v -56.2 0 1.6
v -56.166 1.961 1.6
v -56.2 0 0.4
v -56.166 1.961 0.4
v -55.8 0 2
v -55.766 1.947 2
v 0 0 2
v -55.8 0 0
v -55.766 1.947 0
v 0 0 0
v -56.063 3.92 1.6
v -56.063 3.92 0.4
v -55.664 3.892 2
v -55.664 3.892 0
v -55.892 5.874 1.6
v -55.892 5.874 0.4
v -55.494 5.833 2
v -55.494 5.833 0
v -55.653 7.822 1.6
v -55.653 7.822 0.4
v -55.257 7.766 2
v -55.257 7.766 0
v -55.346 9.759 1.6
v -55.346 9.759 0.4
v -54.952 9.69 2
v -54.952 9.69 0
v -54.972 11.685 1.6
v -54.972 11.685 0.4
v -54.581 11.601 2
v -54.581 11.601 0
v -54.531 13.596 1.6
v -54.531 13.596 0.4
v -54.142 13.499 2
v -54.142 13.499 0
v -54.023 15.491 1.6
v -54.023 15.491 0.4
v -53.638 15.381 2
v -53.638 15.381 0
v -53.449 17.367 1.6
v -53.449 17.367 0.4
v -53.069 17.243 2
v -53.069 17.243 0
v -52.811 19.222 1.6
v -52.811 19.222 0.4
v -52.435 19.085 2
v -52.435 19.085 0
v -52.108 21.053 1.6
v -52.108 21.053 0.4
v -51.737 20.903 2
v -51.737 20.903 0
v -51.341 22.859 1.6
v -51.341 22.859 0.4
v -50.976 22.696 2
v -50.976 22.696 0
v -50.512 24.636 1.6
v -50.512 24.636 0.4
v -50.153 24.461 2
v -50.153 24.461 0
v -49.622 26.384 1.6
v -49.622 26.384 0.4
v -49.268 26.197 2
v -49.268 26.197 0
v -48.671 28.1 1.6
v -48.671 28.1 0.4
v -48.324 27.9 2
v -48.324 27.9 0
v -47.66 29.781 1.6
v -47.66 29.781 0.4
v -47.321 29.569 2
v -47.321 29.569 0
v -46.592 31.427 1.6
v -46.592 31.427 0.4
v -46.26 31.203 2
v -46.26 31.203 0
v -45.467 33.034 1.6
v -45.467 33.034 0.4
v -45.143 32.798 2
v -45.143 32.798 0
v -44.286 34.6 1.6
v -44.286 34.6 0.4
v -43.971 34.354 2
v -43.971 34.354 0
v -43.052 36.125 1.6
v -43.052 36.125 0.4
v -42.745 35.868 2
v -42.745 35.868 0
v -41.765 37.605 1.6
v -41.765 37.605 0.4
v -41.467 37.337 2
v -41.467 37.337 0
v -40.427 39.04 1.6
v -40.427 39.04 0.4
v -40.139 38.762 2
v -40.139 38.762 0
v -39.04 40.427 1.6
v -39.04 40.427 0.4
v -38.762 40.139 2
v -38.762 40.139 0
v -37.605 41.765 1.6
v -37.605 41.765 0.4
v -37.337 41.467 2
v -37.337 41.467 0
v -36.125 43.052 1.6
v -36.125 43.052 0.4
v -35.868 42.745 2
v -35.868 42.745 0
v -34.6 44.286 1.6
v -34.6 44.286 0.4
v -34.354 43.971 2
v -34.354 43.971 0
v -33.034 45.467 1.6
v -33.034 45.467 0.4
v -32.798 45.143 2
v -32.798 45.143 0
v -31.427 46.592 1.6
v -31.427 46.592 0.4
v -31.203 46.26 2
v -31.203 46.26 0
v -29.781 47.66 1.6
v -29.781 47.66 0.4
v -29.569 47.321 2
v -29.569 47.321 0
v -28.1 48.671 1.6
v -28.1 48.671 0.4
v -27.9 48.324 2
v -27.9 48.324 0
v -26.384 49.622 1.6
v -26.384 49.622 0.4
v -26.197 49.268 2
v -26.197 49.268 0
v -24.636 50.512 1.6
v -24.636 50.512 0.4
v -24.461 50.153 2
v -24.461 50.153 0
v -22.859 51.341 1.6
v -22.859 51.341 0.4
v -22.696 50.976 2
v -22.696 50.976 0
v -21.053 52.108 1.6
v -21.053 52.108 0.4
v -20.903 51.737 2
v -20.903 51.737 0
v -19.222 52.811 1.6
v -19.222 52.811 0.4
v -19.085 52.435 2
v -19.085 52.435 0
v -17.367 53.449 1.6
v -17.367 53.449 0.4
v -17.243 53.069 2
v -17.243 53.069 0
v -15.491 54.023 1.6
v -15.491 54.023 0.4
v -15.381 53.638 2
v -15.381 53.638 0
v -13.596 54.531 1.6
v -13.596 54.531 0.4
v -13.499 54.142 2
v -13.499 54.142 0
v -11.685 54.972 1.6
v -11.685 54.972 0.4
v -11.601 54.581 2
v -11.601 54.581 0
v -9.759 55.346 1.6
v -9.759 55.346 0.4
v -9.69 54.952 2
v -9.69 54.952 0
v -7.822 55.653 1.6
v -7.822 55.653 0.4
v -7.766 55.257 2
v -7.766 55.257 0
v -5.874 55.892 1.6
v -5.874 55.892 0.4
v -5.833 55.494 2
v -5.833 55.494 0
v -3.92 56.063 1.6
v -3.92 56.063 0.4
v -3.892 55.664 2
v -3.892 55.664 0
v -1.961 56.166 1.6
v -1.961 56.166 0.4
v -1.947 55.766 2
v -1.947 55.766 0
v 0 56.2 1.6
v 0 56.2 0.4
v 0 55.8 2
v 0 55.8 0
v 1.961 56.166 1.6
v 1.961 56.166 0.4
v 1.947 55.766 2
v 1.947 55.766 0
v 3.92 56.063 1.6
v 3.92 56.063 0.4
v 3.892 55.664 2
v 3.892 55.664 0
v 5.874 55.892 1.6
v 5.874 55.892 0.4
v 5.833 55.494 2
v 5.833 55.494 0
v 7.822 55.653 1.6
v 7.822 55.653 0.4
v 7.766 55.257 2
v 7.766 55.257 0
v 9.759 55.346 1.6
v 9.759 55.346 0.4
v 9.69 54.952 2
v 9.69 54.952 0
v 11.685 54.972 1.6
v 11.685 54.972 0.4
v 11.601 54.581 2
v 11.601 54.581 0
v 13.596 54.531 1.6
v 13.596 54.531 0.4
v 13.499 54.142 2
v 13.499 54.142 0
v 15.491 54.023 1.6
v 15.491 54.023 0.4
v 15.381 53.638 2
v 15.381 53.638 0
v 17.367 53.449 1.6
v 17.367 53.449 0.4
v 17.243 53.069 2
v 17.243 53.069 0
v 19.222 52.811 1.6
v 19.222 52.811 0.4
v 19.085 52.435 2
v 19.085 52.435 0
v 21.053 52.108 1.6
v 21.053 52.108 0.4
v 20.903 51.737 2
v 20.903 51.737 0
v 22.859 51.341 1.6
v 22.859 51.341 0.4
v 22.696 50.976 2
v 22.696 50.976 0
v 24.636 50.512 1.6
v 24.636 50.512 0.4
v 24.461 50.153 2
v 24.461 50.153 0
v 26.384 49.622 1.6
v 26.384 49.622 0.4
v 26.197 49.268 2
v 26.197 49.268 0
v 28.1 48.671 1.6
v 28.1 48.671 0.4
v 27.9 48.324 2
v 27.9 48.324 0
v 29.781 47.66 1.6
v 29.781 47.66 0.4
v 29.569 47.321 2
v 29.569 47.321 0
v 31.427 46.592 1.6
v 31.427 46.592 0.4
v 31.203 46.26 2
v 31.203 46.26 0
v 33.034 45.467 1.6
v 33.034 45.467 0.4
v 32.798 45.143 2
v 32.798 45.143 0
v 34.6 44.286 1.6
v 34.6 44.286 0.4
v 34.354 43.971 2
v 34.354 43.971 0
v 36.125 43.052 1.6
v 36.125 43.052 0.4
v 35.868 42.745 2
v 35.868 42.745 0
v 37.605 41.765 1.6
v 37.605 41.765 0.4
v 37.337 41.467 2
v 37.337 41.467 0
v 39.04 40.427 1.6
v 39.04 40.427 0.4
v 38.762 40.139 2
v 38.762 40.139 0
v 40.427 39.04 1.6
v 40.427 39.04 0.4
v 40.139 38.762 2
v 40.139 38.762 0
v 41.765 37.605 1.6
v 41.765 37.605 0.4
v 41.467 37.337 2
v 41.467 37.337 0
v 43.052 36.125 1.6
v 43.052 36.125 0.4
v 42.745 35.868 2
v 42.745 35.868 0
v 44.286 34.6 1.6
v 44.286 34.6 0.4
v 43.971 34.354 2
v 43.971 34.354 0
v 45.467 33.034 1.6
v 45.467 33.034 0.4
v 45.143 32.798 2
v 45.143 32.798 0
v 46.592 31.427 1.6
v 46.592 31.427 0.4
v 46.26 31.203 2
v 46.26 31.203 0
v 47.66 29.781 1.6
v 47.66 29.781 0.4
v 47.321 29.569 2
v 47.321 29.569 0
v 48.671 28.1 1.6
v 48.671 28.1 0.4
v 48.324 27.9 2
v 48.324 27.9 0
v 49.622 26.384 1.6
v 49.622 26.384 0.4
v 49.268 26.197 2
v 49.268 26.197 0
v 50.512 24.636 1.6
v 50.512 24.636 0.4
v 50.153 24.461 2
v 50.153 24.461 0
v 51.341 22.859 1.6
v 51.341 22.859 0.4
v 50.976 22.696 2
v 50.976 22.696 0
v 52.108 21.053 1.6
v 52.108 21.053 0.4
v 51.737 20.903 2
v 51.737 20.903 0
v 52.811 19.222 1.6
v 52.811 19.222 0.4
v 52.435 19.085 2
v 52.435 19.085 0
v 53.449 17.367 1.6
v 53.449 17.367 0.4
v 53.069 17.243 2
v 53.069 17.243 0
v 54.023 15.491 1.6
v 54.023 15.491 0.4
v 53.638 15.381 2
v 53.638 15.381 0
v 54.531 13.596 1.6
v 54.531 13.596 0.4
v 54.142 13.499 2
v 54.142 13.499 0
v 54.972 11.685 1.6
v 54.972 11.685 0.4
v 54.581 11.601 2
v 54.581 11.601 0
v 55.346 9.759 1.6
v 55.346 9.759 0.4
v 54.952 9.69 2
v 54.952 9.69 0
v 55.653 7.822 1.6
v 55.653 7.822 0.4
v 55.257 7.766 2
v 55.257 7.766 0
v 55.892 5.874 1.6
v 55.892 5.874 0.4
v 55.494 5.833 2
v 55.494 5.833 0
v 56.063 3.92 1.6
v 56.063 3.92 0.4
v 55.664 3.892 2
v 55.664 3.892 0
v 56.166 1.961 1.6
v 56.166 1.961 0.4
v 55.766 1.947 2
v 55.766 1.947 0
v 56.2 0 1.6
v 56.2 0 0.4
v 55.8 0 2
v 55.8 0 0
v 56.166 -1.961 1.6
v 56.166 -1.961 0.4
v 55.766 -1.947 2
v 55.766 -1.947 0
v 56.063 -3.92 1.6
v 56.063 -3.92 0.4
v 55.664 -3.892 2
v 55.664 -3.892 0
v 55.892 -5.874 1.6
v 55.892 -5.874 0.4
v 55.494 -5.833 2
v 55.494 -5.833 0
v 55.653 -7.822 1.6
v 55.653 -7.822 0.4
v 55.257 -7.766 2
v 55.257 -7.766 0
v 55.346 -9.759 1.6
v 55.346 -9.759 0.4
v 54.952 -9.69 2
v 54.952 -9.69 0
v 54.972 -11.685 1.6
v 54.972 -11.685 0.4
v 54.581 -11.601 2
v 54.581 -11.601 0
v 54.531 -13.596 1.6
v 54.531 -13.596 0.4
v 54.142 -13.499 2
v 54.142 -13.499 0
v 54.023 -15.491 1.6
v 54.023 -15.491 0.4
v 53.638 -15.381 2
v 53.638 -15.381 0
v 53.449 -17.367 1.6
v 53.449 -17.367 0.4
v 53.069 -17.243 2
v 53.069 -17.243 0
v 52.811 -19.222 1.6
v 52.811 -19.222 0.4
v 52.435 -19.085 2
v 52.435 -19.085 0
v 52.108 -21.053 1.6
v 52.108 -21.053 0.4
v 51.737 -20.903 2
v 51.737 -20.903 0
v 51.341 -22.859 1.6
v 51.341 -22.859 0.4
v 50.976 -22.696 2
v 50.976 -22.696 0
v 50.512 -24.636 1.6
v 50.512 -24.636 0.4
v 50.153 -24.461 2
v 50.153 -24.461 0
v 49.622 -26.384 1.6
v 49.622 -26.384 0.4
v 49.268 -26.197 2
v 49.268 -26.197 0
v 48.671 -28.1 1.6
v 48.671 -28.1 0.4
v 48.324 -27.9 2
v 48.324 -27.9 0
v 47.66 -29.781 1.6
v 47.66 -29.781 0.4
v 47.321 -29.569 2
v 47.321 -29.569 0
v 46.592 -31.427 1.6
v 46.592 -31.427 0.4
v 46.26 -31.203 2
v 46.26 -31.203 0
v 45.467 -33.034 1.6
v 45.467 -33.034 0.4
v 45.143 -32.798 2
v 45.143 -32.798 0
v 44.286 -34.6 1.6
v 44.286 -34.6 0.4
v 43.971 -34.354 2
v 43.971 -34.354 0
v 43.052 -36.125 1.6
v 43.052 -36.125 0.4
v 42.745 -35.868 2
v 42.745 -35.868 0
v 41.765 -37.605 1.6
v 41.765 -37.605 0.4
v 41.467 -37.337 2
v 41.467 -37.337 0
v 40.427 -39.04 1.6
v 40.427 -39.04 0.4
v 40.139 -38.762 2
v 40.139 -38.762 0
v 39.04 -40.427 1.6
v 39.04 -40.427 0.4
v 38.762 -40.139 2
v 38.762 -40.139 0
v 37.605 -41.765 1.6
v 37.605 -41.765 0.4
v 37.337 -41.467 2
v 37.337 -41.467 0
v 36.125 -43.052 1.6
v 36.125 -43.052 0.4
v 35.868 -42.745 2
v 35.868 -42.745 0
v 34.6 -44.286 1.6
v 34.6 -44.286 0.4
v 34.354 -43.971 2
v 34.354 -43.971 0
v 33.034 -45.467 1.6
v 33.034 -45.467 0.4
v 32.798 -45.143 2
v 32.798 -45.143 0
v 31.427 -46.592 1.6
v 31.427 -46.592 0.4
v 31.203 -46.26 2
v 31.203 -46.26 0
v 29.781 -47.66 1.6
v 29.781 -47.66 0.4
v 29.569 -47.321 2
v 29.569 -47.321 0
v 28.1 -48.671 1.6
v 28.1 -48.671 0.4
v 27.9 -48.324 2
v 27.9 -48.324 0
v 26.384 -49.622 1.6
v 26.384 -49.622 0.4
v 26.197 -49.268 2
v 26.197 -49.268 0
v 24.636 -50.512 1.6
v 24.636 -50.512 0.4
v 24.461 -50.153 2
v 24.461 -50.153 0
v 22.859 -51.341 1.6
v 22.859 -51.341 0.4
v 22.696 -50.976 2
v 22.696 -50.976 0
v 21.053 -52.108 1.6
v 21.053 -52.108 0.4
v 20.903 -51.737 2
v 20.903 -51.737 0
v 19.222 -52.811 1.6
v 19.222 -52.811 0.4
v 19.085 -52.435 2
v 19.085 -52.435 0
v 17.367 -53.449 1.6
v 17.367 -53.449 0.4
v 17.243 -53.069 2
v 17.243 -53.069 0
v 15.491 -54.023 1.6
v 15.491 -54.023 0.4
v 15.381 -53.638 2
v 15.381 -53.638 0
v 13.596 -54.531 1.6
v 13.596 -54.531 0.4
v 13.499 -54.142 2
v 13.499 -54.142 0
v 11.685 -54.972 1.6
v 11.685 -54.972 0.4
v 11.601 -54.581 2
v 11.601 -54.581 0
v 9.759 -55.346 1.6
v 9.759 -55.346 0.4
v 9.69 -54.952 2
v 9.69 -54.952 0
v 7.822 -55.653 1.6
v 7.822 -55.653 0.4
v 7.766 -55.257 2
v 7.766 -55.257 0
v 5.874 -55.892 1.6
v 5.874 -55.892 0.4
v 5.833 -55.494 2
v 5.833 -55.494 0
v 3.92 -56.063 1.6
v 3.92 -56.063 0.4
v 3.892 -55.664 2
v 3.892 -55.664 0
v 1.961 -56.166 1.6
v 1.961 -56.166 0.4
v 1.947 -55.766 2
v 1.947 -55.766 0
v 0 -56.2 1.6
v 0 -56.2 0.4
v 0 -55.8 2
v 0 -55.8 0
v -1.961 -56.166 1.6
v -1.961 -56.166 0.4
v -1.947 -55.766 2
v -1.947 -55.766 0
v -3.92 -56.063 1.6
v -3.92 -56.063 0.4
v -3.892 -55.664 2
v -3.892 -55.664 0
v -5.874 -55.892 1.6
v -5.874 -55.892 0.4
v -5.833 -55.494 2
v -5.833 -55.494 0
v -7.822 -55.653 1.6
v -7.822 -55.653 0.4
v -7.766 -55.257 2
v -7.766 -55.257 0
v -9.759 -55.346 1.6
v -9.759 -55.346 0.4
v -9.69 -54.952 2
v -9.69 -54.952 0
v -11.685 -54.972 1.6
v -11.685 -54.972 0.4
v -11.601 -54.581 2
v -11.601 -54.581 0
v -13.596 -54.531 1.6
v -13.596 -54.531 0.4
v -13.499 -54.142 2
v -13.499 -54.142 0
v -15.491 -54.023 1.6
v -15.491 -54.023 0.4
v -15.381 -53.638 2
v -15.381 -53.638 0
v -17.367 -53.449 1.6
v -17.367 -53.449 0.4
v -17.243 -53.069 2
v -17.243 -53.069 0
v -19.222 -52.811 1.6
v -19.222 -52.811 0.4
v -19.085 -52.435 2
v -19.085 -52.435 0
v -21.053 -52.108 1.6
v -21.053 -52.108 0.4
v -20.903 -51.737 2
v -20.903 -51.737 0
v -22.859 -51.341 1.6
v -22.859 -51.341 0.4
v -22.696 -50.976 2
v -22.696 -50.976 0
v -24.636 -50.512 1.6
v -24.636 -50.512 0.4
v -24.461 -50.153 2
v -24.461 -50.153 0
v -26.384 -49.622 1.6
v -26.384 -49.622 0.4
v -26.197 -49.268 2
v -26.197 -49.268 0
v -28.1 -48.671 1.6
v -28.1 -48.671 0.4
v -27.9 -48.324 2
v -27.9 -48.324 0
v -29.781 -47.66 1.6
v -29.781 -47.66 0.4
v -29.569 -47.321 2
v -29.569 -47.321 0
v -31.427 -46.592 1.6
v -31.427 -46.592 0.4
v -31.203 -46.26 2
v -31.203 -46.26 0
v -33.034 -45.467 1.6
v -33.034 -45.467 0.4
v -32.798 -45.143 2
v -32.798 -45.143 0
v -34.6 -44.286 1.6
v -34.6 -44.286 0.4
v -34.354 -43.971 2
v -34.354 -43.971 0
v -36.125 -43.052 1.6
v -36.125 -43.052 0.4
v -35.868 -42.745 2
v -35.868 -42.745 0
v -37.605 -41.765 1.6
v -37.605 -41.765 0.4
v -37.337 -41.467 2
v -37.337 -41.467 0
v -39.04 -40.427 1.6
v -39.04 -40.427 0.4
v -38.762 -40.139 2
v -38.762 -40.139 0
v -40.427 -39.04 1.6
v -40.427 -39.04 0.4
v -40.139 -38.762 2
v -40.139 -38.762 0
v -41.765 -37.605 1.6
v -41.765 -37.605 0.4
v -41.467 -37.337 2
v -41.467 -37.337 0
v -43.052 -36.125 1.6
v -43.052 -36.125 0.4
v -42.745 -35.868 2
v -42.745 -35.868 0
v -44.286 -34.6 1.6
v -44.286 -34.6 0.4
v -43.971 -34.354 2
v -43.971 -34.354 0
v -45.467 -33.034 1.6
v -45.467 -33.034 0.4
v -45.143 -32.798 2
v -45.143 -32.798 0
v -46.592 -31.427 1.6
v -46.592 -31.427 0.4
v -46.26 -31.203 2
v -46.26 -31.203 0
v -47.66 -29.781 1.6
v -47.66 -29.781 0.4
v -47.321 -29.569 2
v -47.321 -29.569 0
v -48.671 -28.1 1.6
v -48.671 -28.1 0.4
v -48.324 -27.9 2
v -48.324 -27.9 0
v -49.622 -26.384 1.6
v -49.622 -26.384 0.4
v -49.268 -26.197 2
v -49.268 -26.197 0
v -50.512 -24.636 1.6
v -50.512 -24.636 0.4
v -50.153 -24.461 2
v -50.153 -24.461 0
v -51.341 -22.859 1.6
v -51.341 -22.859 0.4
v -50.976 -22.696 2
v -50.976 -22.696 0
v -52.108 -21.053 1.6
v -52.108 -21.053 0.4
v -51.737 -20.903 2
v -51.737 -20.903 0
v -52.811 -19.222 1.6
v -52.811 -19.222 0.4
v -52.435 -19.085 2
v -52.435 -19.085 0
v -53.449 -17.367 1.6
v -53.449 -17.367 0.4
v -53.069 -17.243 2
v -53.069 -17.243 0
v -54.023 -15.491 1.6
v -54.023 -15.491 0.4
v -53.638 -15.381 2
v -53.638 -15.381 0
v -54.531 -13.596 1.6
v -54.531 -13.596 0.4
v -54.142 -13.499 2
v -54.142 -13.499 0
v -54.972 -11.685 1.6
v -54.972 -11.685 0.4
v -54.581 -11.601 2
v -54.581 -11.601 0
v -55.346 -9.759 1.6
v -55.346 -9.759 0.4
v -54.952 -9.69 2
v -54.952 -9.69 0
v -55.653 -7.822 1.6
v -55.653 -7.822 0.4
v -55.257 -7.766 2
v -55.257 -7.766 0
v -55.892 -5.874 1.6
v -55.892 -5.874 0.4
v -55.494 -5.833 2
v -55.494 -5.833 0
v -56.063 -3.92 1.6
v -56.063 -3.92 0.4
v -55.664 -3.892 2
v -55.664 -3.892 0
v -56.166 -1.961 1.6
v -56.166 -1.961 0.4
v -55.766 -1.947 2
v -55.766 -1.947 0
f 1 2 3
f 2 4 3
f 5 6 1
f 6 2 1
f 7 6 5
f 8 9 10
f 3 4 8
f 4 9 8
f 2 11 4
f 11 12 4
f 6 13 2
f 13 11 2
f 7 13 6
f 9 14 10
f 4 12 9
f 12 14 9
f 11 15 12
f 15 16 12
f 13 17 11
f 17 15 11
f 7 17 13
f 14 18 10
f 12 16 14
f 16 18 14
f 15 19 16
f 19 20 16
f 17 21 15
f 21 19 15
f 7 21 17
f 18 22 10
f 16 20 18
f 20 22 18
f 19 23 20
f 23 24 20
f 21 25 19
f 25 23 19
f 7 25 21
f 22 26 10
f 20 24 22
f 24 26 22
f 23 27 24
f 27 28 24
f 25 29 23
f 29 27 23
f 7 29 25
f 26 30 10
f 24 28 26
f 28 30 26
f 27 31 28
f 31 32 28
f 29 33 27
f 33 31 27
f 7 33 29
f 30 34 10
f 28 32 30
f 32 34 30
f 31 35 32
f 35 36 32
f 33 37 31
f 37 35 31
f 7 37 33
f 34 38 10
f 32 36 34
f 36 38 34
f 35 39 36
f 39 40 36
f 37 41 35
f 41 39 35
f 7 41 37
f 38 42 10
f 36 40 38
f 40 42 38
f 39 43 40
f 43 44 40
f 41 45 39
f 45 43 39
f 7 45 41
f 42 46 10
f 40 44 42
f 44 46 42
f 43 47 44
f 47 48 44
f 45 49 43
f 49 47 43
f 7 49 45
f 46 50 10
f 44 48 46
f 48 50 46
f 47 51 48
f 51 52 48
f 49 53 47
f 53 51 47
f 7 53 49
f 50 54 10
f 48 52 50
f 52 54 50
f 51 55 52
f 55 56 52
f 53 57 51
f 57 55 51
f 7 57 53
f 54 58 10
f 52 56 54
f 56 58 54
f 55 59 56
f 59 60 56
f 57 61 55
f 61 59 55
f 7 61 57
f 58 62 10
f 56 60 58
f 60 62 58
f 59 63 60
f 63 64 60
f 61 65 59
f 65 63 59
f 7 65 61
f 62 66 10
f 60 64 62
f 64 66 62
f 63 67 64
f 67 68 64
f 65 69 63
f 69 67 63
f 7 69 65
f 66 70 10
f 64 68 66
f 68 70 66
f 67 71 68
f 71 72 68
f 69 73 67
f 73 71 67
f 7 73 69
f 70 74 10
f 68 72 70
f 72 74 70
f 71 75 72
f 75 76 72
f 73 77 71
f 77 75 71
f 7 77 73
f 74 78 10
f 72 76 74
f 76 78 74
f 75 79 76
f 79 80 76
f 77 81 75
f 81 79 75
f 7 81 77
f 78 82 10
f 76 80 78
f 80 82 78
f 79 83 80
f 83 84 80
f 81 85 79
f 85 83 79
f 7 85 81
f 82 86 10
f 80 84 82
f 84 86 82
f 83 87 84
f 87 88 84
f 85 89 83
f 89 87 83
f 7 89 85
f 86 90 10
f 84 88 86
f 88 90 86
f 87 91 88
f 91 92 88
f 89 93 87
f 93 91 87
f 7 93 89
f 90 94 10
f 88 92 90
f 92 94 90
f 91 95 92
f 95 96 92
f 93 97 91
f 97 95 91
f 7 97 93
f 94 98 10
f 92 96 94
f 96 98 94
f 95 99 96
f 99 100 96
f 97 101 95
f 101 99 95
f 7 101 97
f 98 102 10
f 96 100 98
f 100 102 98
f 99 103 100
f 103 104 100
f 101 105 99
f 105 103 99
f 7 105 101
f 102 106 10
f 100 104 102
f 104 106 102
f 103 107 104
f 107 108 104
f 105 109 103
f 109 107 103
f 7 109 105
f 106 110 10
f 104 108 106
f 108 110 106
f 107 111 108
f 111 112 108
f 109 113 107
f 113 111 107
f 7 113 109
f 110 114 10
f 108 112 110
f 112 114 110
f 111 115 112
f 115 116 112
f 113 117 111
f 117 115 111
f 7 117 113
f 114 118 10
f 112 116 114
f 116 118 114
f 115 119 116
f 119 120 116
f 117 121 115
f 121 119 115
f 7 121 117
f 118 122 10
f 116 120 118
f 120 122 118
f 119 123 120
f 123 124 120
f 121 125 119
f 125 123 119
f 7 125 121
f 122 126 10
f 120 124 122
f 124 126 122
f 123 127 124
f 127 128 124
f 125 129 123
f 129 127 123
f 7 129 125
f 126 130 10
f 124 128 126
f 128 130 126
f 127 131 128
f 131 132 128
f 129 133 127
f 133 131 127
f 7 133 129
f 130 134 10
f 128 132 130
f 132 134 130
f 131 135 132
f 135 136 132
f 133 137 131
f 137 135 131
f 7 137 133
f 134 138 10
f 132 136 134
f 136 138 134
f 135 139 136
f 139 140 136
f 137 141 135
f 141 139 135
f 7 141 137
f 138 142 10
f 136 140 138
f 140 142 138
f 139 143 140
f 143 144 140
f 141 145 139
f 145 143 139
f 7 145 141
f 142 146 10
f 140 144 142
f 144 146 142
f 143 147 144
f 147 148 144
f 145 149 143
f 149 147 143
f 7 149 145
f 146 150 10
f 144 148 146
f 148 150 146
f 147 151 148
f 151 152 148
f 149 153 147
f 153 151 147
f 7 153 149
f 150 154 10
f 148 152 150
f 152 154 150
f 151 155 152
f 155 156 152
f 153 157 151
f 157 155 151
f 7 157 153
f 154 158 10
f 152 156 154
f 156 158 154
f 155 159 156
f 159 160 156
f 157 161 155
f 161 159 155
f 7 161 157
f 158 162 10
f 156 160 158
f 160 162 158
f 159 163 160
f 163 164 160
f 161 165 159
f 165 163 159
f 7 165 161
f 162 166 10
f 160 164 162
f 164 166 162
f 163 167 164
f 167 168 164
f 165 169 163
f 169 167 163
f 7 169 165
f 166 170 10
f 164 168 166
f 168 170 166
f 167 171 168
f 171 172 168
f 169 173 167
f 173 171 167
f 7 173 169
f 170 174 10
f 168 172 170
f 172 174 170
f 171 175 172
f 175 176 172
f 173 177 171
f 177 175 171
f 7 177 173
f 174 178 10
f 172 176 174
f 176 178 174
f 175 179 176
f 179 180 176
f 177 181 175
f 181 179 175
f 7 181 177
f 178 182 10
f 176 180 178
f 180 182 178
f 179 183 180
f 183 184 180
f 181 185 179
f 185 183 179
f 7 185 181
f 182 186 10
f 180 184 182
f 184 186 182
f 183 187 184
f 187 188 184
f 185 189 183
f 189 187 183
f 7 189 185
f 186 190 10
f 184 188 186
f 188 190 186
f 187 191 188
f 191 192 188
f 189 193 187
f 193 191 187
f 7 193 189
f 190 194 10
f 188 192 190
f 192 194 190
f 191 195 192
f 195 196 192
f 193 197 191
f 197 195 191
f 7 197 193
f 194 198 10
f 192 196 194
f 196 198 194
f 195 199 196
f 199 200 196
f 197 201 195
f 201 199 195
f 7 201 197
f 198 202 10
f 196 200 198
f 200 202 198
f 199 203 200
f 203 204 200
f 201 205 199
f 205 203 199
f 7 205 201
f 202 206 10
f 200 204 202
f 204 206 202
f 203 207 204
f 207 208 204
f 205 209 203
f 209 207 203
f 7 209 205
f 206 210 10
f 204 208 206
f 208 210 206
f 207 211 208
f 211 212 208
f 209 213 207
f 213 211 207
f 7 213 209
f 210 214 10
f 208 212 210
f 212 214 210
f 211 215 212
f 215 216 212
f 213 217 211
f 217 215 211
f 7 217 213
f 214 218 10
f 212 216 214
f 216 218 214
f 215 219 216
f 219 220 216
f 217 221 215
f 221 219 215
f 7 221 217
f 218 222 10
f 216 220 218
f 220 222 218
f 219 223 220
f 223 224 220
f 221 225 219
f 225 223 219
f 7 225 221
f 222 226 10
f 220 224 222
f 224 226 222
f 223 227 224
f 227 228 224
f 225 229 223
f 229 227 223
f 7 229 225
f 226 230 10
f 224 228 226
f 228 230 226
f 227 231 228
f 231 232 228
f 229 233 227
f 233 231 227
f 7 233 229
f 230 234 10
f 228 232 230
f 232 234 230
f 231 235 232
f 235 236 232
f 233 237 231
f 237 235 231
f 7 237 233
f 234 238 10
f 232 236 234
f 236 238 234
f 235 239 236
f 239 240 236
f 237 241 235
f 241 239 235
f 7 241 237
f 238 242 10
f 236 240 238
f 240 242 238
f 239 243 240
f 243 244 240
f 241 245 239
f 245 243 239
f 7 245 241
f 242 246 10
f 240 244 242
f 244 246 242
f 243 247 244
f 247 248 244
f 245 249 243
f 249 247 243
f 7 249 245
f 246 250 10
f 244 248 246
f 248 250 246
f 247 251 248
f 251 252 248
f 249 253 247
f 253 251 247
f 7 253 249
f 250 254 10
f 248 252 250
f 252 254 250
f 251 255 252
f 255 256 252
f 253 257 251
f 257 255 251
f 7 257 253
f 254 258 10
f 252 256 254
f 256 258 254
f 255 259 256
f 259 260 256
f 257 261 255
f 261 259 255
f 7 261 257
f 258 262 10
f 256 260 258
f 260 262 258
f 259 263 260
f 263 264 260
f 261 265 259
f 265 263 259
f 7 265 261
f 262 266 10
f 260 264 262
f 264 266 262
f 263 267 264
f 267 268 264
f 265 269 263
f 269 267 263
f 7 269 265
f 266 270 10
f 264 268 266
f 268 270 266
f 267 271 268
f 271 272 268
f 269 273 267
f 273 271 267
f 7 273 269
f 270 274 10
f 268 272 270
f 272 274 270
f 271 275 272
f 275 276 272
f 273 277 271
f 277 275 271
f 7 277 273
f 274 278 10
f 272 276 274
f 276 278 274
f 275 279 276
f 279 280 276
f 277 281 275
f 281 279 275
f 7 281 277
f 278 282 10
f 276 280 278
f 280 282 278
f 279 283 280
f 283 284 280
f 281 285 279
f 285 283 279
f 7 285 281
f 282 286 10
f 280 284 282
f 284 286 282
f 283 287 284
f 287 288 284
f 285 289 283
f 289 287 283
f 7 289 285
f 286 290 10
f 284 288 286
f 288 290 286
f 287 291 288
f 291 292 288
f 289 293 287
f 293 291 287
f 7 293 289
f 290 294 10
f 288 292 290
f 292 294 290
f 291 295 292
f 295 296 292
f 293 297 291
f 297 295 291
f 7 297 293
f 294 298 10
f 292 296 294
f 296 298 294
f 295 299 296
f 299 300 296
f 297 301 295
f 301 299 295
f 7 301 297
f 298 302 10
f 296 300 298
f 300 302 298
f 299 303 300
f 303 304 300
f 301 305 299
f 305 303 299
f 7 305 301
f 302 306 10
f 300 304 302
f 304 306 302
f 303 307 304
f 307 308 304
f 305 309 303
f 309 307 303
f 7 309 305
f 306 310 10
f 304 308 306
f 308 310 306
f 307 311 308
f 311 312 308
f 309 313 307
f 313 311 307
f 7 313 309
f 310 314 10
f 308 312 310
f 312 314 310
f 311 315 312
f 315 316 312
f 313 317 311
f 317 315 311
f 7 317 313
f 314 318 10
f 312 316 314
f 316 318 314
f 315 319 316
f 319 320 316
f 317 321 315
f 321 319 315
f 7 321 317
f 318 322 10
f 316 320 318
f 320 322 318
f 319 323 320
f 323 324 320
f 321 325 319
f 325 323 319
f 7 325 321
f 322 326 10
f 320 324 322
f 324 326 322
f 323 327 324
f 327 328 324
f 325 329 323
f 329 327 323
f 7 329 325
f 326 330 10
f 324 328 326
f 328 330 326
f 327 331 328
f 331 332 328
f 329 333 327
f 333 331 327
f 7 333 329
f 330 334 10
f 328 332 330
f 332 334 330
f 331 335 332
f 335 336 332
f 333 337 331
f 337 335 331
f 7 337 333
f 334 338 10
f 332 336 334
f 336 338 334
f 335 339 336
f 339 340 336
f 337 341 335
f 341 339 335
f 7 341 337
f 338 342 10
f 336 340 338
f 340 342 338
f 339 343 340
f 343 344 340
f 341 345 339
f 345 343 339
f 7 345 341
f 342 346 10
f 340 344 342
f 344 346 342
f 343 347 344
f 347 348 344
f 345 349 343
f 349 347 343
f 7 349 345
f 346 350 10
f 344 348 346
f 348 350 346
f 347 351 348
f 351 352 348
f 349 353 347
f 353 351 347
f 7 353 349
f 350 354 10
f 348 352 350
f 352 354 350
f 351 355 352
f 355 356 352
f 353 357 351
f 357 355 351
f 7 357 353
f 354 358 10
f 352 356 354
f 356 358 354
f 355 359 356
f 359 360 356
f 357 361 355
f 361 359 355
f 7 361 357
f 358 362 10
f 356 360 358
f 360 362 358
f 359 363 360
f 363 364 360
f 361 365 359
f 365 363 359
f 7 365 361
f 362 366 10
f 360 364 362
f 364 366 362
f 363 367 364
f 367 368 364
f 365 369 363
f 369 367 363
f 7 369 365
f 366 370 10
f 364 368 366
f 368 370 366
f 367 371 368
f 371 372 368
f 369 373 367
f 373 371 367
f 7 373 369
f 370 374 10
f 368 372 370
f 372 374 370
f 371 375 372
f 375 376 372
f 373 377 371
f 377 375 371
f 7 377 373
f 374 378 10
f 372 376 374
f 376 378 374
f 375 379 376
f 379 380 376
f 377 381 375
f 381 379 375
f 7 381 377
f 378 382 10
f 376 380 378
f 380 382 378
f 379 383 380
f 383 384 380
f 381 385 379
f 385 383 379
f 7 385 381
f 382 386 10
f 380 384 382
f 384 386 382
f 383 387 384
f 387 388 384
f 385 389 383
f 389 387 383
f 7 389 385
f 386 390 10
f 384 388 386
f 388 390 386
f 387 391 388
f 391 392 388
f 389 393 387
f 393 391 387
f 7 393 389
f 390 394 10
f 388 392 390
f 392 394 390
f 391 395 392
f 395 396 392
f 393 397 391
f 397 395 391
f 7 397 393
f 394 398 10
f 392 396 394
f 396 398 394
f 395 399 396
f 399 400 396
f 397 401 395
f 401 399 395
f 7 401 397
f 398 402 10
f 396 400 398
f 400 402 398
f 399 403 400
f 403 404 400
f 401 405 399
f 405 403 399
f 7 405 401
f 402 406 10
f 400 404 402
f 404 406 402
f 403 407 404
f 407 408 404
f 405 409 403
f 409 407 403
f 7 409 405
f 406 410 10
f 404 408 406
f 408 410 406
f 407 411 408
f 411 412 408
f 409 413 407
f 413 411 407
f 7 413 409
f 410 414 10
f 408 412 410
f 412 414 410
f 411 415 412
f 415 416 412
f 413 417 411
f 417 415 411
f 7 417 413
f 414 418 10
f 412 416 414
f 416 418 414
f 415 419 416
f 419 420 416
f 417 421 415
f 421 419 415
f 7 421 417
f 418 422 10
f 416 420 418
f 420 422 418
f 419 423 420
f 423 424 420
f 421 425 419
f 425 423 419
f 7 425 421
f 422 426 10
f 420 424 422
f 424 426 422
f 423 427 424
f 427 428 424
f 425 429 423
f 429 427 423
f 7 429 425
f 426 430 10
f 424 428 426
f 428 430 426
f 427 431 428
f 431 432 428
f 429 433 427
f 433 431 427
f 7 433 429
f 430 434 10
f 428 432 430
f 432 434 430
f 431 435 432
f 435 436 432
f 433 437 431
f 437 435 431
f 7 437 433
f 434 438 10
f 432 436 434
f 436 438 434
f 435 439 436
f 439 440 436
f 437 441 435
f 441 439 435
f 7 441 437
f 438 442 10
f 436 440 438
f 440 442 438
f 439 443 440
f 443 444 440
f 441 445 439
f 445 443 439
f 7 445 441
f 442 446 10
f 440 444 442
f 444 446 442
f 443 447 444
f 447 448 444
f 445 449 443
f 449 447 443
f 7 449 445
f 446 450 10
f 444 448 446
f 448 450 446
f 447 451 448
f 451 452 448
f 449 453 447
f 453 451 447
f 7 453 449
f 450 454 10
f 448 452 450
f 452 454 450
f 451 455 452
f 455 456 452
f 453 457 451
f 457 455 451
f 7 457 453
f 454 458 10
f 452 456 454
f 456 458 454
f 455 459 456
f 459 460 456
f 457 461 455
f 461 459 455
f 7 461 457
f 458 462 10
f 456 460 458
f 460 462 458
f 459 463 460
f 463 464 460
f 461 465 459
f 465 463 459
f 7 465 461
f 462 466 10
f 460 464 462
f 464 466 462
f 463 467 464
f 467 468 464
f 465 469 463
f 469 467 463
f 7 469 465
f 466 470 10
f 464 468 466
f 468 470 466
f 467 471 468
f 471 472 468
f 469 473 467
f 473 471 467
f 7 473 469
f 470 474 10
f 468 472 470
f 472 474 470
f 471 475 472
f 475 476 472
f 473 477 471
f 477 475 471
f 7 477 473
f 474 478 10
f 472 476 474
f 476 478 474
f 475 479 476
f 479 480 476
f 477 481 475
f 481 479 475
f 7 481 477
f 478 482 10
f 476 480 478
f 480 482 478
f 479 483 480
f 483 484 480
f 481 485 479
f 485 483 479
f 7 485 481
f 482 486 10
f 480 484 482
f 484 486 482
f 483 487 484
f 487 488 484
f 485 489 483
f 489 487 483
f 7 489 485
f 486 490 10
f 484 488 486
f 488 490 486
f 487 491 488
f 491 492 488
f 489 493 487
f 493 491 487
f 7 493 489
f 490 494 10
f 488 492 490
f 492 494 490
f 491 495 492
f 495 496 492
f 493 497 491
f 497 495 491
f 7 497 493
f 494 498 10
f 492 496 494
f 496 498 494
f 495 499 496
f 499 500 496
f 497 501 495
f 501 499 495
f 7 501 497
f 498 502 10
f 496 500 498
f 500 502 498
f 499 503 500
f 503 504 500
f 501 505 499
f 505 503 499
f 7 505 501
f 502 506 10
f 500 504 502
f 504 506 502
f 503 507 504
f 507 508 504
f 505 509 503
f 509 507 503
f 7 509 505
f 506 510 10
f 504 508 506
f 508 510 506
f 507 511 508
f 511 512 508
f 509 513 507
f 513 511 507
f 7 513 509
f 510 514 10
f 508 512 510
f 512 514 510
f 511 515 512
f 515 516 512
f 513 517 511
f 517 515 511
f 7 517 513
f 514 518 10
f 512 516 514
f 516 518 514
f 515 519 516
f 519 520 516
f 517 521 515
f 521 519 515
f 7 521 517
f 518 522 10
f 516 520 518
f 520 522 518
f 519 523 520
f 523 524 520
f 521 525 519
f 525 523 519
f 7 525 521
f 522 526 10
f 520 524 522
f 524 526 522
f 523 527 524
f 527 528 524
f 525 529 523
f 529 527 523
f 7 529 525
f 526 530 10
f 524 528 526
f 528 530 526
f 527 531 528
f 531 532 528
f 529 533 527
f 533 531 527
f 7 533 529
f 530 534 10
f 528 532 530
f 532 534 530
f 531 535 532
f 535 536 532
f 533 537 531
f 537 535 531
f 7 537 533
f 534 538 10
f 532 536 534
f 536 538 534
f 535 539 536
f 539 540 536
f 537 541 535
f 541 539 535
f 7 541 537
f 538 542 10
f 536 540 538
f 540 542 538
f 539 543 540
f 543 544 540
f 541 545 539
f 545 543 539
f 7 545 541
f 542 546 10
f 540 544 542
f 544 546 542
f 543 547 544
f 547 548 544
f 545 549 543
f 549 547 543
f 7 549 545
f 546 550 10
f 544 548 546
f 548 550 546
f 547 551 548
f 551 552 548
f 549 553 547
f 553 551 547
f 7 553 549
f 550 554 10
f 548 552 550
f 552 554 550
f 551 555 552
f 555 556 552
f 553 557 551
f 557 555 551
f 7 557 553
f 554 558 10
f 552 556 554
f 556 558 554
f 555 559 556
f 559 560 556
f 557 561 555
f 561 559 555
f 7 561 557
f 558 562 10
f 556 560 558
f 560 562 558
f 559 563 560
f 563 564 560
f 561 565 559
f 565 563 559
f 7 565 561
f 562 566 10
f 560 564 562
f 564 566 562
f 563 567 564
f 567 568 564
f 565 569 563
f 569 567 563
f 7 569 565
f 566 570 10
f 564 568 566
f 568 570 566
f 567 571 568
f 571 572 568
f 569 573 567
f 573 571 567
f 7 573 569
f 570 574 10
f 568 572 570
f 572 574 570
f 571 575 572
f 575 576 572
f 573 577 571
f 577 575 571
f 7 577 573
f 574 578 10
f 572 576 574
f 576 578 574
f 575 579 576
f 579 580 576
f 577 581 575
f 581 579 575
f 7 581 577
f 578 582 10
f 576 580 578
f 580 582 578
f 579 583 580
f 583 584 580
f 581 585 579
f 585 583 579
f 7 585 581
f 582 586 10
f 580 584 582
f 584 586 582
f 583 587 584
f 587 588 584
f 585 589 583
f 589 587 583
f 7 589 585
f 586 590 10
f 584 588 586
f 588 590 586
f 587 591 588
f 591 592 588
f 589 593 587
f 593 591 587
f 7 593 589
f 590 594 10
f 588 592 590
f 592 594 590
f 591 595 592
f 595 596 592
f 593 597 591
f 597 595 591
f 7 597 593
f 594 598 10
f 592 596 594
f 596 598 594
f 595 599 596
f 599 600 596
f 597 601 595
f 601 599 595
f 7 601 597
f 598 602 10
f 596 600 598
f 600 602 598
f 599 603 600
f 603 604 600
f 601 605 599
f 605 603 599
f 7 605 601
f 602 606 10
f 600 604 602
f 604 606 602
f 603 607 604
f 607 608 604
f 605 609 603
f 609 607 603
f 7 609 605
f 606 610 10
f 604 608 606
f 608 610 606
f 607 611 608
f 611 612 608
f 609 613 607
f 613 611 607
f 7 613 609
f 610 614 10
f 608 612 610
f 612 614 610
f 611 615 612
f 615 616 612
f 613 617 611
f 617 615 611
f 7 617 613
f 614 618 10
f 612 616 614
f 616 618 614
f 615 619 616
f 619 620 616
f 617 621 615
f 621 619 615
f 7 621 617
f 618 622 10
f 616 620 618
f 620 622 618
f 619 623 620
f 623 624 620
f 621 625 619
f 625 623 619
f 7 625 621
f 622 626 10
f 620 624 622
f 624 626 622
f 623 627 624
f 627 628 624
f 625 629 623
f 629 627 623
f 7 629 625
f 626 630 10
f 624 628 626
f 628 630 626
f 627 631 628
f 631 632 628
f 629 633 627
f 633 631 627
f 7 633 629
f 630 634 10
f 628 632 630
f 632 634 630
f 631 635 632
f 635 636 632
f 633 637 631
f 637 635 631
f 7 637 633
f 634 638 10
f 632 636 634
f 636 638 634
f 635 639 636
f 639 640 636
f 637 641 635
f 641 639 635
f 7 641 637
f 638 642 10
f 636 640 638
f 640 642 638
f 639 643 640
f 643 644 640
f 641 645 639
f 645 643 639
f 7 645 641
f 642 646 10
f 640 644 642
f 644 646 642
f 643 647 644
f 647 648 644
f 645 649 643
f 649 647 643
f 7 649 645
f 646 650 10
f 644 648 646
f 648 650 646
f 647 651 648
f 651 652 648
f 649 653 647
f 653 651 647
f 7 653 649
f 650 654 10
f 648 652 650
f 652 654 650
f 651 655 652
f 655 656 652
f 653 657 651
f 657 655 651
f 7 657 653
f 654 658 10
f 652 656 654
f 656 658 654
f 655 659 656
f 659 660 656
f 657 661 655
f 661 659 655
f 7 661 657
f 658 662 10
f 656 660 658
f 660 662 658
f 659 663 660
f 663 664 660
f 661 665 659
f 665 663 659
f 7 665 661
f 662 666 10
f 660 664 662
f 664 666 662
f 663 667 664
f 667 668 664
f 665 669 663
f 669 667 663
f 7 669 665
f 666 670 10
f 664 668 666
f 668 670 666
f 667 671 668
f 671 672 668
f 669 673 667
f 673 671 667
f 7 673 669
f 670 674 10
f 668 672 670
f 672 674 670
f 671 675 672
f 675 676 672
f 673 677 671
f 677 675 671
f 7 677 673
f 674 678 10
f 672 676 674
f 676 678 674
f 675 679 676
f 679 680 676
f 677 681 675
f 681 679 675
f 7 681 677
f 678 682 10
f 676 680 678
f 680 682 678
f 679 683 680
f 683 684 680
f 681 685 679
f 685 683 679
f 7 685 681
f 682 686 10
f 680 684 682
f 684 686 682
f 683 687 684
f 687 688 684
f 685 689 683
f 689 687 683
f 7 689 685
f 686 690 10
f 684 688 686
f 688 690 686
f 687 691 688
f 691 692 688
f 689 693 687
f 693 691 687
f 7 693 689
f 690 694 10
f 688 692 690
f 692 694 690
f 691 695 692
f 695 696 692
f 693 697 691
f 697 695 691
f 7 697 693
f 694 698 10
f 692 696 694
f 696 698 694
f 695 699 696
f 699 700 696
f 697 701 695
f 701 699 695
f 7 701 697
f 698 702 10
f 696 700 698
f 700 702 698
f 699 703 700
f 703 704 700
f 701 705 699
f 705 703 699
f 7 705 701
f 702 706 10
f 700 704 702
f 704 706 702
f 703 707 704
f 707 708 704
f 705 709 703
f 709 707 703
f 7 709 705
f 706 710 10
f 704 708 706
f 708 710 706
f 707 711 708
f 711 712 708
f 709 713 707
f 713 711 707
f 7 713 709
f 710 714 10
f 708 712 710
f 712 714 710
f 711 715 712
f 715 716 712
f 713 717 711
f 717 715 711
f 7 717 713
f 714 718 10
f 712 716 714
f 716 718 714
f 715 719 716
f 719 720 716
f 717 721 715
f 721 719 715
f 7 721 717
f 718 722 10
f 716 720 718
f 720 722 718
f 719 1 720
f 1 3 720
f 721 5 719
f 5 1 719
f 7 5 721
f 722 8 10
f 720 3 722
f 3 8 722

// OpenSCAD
// can-light-trim.scad
//
// A replacement trim and lens for the recessed can light outside the
// bedroom, which has lost its own. Two printed pieces: a white PETG trim
// whose collar pushes into the 118 mm hole and whose flange covers the
// ceiling around it, and a clear PETG lens that drops into the collar from
// the back before the trim goes up.
//
// The lens rests on a ledge at the back of the flange, so in the ceiling
// gravity holds it against the ledge; six small nubs above it stop it
// rattling or falling out while the trim is in the hand.
//
// The trim holds itself in by friction: the collar is slotted into
// fingers, and a ridge on each finger stands proud of the hole so the
// fingers flex in as the collar goes up.
//
// ⚠️ ASSUMED: 118 mm is the hole the collar goes into (Ziad, 2026-10-11),
// and whatever it grips (drywall edge or can wall) is at least as deep as
// grip_z. Not yet confirmed which it is, or how deep it runs.
// ⚠️ ASSUMED: an LED lamp. PETG softens around 80 °C; an incandescent or
// halogen lamp this close to the lens and collar will warp them.
// ⚠️ ASSUMED: nothing in the can (lamp, socket) reaches down within
// collar_h of the ceiling.
//
// Axes: print orientation. Z=0 is the visible face, flat on the bed; +Z
// runs up into the ceiling. The flange's back (Z=flange_t) sits on the
// ceiling.
//
// Build each piece under its own name:
//   utils/build.sh parts/can-light-trim.scad -D 'show="trim"' --name can-light-trim
//   utils/build.sh parts/can-light-trim.scad -D 'show="lens"' --name can-light-lens

/* [View] */
show = "lens"; // [assembly, section, trim, lens]

/* [Measured] */
hole_d = 118; // mm, ceiling hole the collar goes into

/* [Flange] */
border = 20; // mm, flange width beyond the hole edge
flange_t = 3.0; // mm, face to ceiling
edge_chamfer = 1.2; // mm, 45° on the visible outer edge; also beats elephant's foot
aperture_chamfer = 1.0; // mm, 45° on the visible aperture edge

/* [Collar] */
collar_fit = 0.4; // mm per side, collar to hole, before the ridges
collar_wall = 2.10; // mm, 5 × 0.42 lines on a 0.4 nozzle
collar_h = 25; // mm, above the ceiling
collar_lead = 1.0; // mm, 45° outer chamfer at the top so it finds the hole
finger_count = 12;
finger_slot_w = 2.5; // mm, gap between fingers
finger_base_h = 8; // mm, solid ring above the flange before the slots start

/* [Grip ridge] */
grip_interference = 0.8; // mm per side beyond the hole wall
grip_z = 12; // mm above the ceiling, ridge centre
grip_flat = 1.0; // mm, flat crest height; flanks are 45°

/* [Lens] */
lens_t = 2.0; // mm, ten 0.20 layers
lens_fit = 0.3; // mm per side, lens to collar bore
lens_ledge = 3.0; // mm, how far the ledge reaches in under the lens
lens_chamfer = 0.4; // mm, both edges of the lens

/* [Retaining nubs] */
nub_count = 6;
nub_depth = 0.8; // mm, inward from the collar bore
nub_arc = 8; // degrees each
nub_gap = 0.15; // mm, lens top to nub underside

/* [Colors] */
trim_color = "WhiteSmoke";
lens_color = [0.75, 0.88, 1.0, 0.55];

/* [Resolution] */
$fa = 2;
$fs = 0.4;
eps = 0.01; // mm, overshoot on cuts

/* [Derived] */
hole_r = hole_d / 2;
collar_or = hole_r - collar_fit;
collar_ir = collar_or - collar_wall;
aperture_r = collar_ir - lens_ledge;
flange_r = hole_r + border;
collar_top = flange_t + collar_h;
lens_r = collar_ir - lens_fit;
grip_p = collar_fit + grip_interference; // ridge projection past the collar
grip_zc = flange_t + grip_z;
nub_z = flange_t + lens_t + nub_gap;

assert(lens_r > aperture_r + 1, "Lens must rest on the ledge");
assert(lens_r > collar_ir - nub_depth, "Nubs must overlap the lens");
assert(nub_z + 2*nub_depth < flange_t + finger_base_h, "Nubs belong on the solid ring");
assert(grip_zc - grip_flat/2 - grip_p > flange_t + finger_base_h, "Ridge must sit on the fingers");
assert(grip_zc + grip_flat/2 + grip_p < collar_top - collar_lead, "Ridge must clear the lead-in");
assert(2*flange_r <= 205, "Flange exceeds the safe build envelope");

module trim_profile() {
    polygon([
        [aperture_r + aperture_chamfer, 0],
        [flange_r - edge_chamfer, 0],
        [flange_r, edge_chamfer],
        [flange_r, flange_t],
        [collar_or, flange_t],
        [collar_or, collar_top - collar_lead],
        [collar_or - collar_lead, collar_top],
        [collar_ir, collar_top],
        [collar_ir, flange_t],
        [aperture_r, flange_t],
        [aperture_r, aperture_chamfer],
    ]);
}

module grip_profile() {
    z0 = grip_zc - grip_flat/2;
    z1 = grip_zc + grip_flat/2;
    polygon([
        [collar_or - eps, z0 - grip_p],
        [collar_or + grip_p, z0],
        [collar_or + grip_p, z1],
        [collar_or - eps, z1 + grip_p],
    ]);
}

module nub_profile() {
    polygon([
        [collar_ir + eps, nub_z],
        [collar_ir - nub_depth, nub_z + nub_depth],
        [collar_ir + eps, nub_z + 2*nub_depth],
    ]);
}

module finger_slots() {
    for (i = [0 : finger_count - 1])
        rotate(i * 360 / finger_count)
            translate([collar_ir - 1, -finger_slot_w/2, flange_t + finger_base_h])
                cube([collar_wall + grip_p + 2, finger_slot_w, collar_h]);
}

module trim() {
    color(trim_color)
        difference() {
            union() {
                rotate_extrude() trim_profile();
                rotate_extrude() grip_profile();
                for (i = [0 : nub_count - 1])
                    rotate(i * 360 / nub_count - nub_arc/2)
                        rotate_extrude(angle = nub_arc) nub_profile();
            }
            finger_slots();
        }
}

module lens() {
    color(lens_color)
        rotate_extrude()
            polygon([
                [0, 0],
                [lens_r - lens_chamfer, 0],
                [lens_r, lens_chamfer],
                [lens_r, lens_t - lens_chamfer],
                [lens_r - lens_chamfer, lens_t],
                [0, lens_t],
            ]);
}

module assembly() {
    trim();
    translate([0, 0, flange_t]) lens();
}

if (show == "trim") trim();
else if (show == "lens") lens();
else if (show == "section")
    difference() {
        assembly();
        translate([-flange_r - 1, -2*flange_r, -1]) cube([2*flange_r + 2, 2*flange_r, collar_top + 2]);
    }
else assembly();
